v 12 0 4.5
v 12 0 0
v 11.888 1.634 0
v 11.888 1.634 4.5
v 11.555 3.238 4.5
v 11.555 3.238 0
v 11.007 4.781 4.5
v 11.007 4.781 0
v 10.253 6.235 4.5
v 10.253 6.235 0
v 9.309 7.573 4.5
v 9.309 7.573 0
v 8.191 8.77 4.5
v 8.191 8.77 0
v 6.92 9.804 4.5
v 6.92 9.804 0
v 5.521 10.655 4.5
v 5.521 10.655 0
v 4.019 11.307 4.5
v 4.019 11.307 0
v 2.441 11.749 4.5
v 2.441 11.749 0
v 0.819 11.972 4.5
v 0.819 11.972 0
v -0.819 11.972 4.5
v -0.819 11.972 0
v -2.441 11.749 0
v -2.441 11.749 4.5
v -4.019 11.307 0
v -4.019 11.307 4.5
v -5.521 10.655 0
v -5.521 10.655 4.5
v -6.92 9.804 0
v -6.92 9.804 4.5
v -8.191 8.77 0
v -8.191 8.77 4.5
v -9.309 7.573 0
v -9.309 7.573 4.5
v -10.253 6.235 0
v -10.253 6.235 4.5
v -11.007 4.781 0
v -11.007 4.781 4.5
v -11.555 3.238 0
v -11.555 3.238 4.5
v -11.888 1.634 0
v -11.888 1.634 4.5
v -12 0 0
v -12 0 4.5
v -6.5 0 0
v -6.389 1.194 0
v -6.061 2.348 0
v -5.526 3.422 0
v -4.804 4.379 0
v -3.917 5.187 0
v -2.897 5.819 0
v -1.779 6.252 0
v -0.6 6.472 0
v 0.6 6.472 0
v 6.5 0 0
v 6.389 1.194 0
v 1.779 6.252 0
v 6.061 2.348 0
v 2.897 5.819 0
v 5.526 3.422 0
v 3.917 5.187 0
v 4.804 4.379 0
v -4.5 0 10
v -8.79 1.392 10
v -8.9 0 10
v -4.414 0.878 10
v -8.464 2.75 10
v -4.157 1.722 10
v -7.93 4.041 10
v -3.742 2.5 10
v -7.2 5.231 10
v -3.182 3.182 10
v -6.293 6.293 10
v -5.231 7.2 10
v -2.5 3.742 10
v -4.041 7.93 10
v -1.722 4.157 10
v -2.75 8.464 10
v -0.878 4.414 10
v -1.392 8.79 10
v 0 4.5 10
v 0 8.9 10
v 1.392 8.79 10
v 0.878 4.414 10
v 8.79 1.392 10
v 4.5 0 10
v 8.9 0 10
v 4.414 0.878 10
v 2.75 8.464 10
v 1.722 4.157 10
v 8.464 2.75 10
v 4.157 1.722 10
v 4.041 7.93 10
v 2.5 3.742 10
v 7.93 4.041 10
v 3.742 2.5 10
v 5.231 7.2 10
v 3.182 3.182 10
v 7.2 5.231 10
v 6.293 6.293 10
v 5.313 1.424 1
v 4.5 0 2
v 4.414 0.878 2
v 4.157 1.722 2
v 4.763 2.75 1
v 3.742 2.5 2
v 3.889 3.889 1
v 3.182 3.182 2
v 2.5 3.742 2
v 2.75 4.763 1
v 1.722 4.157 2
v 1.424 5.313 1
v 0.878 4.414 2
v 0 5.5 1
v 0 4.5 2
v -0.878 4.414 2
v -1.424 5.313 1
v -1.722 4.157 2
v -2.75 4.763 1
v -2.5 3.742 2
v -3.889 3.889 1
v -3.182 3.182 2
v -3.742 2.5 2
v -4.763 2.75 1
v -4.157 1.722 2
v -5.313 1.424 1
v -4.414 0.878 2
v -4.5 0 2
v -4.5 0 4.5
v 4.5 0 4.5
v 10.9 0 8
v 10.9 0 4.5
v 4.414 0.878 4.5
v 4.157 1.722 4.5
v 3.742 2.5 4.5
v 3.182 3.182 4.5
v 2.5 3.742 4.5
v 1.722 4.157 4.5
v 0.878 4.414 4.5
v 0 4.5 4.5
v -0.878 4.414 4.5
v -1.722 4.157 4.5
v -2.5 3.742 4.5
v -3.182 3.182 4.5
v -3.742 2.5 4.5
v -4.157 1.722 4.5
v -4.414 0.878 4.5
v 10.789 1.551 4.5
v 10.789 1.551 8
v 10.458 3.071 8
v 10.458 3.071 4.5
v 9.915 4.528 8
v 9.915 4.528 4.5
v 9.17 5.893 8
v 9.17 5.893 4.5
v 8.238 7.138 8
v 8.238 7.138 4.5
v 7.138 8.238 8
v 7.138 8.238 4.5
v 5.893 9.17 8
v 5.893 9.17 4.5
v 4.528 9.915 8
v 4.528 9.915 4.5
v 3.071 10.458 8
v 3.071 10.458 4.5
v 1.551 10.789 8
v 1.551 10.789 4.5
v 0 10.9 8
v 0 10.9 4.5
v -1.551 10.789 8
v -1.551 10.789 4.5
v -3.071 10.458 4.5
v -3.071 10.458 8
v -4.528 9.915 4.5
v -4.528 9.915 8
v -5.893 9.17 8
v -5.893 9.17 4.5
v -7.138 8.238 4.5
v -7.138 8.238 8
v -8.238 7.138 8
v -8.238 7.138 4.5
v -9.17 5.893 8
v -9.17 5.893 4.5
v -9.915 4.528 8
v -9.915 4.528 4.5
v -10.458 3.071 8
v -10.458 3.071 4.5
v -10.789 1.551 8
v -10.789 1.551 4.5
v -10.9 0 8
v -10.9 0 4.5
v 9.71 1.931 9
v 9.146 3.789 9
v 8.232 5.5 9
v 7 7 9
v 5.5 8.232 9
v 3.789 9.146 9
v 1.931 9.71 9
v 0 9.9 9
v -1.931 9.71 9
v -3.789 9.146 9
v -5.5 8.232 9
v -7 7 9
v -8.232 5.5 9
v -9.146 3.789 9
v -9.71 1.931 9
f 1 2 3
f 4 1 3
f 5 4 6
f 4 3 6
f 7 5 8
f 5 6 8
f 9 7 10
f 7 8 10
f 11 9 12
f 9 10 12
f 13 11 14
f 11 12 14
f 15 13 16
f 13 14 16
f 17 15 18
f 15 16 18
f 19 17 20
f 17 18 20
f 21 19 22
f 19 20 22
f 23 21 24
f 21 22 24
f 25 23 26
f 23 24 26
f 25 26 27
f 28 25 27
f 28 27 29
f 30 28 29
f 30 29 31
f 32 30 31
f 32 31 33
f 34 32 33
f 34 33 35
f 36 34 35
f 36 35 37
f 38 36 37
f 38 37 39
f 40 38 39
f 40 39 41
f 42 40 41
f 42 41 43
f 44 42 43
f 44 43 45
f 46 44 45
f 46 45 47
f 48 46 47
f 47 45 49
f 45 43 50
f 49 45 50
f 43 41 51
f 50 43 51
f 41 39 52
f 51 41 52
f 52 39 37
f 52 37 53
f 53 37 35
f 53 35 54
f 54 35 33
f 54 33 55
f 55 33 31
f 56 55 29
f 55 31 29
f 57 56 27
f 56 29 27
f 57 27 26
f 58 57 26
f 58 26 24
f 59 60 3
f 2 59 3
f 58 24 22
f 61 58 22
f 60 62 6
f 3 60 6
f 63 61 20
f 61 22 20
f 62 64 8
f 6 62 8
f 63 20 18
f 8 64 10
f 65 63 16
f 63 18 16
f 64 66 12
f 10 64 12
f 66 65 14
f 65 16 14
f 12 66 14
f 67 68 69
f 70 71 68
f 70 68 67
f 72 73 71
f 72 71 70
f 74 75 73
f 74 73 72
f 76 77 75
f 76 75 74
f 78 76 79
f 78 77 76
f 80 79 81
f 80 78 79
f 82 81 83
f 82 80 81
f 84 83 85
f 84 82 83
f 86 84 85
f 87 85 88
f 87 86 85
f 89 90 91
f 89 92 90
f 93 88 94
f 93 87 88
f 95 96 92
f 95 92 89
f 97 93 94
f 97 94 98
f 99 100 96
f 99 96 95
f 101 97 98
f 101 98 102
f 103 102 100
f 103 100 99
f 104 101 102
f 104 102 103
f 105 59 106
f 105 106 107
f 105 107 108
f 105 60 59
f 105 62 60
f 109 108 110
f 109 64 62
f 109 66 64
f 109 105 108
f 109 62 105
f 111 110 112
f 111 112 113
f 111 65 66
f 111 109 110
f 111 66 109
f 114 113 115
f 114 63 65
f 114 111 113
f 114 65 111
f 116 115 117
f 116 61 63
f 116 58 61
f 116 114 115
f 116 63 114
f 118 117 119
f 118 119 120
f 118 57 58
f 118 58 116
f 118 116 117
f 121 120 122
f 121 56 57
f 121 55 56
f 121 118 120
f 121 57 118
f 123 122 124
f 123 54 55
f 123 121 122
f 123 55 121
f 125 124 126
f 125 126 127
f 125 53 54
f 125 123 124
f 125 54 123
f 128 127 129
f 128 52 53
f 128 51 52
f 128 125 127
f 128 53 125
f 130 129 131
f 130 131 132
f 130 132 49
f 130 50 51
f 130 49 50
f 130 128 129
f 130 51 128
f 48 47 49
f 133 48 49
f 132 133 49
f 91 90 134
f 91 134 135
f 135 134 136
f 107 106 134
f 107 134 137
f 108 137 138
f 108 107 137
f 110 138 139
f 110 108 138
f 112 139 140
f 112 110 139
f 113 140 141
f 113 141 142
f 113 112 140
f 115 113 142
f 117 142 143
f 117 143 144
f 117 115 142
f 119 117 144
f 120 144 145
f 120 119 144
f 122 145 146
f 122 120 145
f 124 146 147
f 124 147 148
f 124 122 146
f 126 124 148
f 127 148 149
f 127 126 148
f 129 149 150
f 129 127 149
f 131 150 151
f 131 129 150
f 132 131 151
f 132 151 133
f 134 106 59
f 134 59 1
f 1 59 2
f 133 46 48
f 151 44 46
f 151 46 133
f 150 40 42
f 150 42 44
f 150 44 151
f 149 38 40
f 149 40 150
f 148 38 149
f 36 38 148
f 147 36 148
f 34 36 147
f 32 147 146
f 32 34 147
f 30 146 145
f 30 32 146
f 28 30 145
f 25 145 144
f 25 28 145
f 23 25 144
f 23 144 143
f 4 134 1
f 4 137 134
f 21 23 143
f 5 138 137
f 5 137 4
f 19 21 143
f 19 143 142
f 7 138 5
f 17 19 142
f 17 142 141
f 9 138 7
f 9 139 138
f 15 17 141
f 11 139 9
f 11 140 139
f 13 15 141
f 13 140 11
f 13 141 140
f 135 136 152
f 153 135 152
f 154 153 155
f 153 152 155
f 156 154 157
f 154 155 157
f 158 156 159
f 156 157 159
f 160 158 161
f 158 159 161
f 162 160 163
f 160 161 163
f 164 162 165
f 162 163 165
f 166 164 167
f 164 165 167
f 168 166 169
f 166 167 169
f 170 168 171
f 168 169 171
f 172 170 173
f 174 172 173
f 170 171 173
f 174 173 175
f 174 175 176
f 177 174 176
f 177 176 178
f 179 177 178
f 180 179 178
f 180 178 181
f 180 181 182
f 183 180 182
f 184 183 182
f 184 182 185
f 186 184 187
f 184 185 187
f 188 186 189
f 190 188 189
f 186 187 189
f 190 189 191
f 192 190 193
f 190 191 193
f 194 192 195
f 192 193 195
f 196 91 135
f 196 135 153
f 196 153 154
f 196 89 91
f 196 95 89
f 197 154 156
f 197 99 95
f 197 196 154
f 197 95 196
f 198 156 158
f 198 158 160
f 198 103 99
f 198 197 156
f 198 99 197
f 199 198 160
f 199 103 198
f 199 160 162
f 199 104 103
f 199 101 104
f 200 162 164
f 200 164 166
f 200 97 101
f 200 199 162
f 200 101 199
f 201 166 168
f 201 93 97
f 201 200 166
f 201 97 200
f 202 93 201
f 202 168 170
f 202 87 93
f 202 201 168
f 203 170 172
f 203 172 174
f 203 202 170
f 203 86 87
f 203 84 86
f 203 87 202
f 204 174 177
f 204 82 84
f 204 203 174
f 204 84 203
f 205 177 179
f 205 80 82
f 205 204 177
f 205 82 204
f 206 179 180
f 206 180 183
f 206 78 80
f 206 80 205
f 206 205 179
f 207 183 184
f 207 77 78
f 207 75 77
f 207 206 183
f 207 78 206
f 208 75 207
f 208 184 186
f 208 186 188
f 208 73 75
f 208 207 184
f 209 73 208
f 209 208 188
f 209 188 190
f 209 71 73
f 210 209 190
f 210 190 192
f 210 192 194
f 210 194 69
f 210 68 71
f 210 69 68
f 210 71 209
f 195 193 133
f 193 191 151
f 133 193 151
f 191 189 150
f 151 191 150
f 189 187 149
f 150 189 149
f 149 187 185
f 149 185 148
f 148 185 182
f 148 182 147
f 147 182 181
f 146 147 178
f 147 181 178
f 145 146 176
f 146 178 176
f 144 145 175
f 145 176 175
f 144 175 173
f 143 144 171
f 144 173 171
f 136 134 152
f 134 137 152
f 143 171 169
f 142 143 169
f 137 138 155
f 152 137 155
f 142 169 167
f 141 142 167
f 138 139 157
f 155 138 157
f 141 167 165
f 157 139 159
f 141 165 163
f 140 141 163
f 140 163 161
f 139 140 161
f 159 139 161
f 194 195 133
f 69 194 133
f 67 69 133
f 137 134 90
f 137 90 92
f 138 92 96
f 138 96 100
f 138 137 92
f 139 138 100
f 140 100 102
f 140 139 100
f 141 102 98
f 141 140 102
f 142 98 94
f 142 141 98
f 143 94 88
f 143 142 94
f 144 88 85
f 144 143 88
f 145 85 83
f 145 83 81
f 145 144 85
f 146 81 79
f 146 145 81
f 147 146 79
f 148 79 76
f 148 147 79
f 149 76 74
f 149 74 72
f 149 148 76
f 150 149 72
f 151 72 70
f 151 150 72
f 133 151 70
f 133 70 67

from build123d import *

# Parameters (mm, degrees)
F0_R      = 12
F0_R_2    = 10.9
F0_R_3    = 4.5
F1_DEPTH  = 4.5
F2_START  = 4.5
F2_DEPTH  = 5.5
F3_SIZE   = 2
F3_2_SIZE = 2
F4_W      = 41.8951492757
F4_H      = 15.0316422805
F5_DEPTH  = 25


with BuildPart() as f1:
    # F0 (on Top) → F1 (new body)
    with BuildSketch(Plane.XY):
        Circle(F0_R)
        Circle(F0_R_2, mode=Mode.SUBTRACT)
        Circle(F0_R_2)
        Circle(F0_R_3, mode=Mode.SUBTRACT)
    extrude(amount=F1_DEPTH)

    # F3
    f3_edges = [f1.edges().sort_by_distance(p)[0] for p in [
        (-4.5, 0, 0),
    ]]
    chamfer(f3_edges, length=F3_SIZE)


with BuildPart() as f2:
    # F0 (on Top) → F2 (new body)
    with BuildSketch(Plane.XY.offset(F2_START)):
        Circle(F0_R_2)
        Circle(F0_R_3, mode=Mode.SUBTRACT)
    extrude(amount=F2_DEPTH)

    # F3#2
    f3_2_edges = [f2.edges().sort_by_distance(p)[0] for p in [
        (-10.9, 0, 10),
    ]]
    chamfer(f3_2_edges, length=F3_2_SIZE)


with BuildPart() as f5_tool:
    # F4 (on Top) → F5 (new body)
    with BuildSketch(Plane.XY):
        with Locations((-0.9161634371, -7.5158211403)):
            Rectangle(F4_W, F4_H)
    extrude(amount=F5_DEPTH)


with BuildPart() as f1_1:
    add(f1.part)

    # F5: cut by f5_tool
    add(f5_tool.part, mode=Mode.SUBTRACT)


with BuildPart() as f2_1:
    add(f2.part)

    # F5: cut by f5_tool
    add(f5_tool.part, mode=Mode.SUBTRACT)


solid = Compound([f1_1.part, f2_1.part])
